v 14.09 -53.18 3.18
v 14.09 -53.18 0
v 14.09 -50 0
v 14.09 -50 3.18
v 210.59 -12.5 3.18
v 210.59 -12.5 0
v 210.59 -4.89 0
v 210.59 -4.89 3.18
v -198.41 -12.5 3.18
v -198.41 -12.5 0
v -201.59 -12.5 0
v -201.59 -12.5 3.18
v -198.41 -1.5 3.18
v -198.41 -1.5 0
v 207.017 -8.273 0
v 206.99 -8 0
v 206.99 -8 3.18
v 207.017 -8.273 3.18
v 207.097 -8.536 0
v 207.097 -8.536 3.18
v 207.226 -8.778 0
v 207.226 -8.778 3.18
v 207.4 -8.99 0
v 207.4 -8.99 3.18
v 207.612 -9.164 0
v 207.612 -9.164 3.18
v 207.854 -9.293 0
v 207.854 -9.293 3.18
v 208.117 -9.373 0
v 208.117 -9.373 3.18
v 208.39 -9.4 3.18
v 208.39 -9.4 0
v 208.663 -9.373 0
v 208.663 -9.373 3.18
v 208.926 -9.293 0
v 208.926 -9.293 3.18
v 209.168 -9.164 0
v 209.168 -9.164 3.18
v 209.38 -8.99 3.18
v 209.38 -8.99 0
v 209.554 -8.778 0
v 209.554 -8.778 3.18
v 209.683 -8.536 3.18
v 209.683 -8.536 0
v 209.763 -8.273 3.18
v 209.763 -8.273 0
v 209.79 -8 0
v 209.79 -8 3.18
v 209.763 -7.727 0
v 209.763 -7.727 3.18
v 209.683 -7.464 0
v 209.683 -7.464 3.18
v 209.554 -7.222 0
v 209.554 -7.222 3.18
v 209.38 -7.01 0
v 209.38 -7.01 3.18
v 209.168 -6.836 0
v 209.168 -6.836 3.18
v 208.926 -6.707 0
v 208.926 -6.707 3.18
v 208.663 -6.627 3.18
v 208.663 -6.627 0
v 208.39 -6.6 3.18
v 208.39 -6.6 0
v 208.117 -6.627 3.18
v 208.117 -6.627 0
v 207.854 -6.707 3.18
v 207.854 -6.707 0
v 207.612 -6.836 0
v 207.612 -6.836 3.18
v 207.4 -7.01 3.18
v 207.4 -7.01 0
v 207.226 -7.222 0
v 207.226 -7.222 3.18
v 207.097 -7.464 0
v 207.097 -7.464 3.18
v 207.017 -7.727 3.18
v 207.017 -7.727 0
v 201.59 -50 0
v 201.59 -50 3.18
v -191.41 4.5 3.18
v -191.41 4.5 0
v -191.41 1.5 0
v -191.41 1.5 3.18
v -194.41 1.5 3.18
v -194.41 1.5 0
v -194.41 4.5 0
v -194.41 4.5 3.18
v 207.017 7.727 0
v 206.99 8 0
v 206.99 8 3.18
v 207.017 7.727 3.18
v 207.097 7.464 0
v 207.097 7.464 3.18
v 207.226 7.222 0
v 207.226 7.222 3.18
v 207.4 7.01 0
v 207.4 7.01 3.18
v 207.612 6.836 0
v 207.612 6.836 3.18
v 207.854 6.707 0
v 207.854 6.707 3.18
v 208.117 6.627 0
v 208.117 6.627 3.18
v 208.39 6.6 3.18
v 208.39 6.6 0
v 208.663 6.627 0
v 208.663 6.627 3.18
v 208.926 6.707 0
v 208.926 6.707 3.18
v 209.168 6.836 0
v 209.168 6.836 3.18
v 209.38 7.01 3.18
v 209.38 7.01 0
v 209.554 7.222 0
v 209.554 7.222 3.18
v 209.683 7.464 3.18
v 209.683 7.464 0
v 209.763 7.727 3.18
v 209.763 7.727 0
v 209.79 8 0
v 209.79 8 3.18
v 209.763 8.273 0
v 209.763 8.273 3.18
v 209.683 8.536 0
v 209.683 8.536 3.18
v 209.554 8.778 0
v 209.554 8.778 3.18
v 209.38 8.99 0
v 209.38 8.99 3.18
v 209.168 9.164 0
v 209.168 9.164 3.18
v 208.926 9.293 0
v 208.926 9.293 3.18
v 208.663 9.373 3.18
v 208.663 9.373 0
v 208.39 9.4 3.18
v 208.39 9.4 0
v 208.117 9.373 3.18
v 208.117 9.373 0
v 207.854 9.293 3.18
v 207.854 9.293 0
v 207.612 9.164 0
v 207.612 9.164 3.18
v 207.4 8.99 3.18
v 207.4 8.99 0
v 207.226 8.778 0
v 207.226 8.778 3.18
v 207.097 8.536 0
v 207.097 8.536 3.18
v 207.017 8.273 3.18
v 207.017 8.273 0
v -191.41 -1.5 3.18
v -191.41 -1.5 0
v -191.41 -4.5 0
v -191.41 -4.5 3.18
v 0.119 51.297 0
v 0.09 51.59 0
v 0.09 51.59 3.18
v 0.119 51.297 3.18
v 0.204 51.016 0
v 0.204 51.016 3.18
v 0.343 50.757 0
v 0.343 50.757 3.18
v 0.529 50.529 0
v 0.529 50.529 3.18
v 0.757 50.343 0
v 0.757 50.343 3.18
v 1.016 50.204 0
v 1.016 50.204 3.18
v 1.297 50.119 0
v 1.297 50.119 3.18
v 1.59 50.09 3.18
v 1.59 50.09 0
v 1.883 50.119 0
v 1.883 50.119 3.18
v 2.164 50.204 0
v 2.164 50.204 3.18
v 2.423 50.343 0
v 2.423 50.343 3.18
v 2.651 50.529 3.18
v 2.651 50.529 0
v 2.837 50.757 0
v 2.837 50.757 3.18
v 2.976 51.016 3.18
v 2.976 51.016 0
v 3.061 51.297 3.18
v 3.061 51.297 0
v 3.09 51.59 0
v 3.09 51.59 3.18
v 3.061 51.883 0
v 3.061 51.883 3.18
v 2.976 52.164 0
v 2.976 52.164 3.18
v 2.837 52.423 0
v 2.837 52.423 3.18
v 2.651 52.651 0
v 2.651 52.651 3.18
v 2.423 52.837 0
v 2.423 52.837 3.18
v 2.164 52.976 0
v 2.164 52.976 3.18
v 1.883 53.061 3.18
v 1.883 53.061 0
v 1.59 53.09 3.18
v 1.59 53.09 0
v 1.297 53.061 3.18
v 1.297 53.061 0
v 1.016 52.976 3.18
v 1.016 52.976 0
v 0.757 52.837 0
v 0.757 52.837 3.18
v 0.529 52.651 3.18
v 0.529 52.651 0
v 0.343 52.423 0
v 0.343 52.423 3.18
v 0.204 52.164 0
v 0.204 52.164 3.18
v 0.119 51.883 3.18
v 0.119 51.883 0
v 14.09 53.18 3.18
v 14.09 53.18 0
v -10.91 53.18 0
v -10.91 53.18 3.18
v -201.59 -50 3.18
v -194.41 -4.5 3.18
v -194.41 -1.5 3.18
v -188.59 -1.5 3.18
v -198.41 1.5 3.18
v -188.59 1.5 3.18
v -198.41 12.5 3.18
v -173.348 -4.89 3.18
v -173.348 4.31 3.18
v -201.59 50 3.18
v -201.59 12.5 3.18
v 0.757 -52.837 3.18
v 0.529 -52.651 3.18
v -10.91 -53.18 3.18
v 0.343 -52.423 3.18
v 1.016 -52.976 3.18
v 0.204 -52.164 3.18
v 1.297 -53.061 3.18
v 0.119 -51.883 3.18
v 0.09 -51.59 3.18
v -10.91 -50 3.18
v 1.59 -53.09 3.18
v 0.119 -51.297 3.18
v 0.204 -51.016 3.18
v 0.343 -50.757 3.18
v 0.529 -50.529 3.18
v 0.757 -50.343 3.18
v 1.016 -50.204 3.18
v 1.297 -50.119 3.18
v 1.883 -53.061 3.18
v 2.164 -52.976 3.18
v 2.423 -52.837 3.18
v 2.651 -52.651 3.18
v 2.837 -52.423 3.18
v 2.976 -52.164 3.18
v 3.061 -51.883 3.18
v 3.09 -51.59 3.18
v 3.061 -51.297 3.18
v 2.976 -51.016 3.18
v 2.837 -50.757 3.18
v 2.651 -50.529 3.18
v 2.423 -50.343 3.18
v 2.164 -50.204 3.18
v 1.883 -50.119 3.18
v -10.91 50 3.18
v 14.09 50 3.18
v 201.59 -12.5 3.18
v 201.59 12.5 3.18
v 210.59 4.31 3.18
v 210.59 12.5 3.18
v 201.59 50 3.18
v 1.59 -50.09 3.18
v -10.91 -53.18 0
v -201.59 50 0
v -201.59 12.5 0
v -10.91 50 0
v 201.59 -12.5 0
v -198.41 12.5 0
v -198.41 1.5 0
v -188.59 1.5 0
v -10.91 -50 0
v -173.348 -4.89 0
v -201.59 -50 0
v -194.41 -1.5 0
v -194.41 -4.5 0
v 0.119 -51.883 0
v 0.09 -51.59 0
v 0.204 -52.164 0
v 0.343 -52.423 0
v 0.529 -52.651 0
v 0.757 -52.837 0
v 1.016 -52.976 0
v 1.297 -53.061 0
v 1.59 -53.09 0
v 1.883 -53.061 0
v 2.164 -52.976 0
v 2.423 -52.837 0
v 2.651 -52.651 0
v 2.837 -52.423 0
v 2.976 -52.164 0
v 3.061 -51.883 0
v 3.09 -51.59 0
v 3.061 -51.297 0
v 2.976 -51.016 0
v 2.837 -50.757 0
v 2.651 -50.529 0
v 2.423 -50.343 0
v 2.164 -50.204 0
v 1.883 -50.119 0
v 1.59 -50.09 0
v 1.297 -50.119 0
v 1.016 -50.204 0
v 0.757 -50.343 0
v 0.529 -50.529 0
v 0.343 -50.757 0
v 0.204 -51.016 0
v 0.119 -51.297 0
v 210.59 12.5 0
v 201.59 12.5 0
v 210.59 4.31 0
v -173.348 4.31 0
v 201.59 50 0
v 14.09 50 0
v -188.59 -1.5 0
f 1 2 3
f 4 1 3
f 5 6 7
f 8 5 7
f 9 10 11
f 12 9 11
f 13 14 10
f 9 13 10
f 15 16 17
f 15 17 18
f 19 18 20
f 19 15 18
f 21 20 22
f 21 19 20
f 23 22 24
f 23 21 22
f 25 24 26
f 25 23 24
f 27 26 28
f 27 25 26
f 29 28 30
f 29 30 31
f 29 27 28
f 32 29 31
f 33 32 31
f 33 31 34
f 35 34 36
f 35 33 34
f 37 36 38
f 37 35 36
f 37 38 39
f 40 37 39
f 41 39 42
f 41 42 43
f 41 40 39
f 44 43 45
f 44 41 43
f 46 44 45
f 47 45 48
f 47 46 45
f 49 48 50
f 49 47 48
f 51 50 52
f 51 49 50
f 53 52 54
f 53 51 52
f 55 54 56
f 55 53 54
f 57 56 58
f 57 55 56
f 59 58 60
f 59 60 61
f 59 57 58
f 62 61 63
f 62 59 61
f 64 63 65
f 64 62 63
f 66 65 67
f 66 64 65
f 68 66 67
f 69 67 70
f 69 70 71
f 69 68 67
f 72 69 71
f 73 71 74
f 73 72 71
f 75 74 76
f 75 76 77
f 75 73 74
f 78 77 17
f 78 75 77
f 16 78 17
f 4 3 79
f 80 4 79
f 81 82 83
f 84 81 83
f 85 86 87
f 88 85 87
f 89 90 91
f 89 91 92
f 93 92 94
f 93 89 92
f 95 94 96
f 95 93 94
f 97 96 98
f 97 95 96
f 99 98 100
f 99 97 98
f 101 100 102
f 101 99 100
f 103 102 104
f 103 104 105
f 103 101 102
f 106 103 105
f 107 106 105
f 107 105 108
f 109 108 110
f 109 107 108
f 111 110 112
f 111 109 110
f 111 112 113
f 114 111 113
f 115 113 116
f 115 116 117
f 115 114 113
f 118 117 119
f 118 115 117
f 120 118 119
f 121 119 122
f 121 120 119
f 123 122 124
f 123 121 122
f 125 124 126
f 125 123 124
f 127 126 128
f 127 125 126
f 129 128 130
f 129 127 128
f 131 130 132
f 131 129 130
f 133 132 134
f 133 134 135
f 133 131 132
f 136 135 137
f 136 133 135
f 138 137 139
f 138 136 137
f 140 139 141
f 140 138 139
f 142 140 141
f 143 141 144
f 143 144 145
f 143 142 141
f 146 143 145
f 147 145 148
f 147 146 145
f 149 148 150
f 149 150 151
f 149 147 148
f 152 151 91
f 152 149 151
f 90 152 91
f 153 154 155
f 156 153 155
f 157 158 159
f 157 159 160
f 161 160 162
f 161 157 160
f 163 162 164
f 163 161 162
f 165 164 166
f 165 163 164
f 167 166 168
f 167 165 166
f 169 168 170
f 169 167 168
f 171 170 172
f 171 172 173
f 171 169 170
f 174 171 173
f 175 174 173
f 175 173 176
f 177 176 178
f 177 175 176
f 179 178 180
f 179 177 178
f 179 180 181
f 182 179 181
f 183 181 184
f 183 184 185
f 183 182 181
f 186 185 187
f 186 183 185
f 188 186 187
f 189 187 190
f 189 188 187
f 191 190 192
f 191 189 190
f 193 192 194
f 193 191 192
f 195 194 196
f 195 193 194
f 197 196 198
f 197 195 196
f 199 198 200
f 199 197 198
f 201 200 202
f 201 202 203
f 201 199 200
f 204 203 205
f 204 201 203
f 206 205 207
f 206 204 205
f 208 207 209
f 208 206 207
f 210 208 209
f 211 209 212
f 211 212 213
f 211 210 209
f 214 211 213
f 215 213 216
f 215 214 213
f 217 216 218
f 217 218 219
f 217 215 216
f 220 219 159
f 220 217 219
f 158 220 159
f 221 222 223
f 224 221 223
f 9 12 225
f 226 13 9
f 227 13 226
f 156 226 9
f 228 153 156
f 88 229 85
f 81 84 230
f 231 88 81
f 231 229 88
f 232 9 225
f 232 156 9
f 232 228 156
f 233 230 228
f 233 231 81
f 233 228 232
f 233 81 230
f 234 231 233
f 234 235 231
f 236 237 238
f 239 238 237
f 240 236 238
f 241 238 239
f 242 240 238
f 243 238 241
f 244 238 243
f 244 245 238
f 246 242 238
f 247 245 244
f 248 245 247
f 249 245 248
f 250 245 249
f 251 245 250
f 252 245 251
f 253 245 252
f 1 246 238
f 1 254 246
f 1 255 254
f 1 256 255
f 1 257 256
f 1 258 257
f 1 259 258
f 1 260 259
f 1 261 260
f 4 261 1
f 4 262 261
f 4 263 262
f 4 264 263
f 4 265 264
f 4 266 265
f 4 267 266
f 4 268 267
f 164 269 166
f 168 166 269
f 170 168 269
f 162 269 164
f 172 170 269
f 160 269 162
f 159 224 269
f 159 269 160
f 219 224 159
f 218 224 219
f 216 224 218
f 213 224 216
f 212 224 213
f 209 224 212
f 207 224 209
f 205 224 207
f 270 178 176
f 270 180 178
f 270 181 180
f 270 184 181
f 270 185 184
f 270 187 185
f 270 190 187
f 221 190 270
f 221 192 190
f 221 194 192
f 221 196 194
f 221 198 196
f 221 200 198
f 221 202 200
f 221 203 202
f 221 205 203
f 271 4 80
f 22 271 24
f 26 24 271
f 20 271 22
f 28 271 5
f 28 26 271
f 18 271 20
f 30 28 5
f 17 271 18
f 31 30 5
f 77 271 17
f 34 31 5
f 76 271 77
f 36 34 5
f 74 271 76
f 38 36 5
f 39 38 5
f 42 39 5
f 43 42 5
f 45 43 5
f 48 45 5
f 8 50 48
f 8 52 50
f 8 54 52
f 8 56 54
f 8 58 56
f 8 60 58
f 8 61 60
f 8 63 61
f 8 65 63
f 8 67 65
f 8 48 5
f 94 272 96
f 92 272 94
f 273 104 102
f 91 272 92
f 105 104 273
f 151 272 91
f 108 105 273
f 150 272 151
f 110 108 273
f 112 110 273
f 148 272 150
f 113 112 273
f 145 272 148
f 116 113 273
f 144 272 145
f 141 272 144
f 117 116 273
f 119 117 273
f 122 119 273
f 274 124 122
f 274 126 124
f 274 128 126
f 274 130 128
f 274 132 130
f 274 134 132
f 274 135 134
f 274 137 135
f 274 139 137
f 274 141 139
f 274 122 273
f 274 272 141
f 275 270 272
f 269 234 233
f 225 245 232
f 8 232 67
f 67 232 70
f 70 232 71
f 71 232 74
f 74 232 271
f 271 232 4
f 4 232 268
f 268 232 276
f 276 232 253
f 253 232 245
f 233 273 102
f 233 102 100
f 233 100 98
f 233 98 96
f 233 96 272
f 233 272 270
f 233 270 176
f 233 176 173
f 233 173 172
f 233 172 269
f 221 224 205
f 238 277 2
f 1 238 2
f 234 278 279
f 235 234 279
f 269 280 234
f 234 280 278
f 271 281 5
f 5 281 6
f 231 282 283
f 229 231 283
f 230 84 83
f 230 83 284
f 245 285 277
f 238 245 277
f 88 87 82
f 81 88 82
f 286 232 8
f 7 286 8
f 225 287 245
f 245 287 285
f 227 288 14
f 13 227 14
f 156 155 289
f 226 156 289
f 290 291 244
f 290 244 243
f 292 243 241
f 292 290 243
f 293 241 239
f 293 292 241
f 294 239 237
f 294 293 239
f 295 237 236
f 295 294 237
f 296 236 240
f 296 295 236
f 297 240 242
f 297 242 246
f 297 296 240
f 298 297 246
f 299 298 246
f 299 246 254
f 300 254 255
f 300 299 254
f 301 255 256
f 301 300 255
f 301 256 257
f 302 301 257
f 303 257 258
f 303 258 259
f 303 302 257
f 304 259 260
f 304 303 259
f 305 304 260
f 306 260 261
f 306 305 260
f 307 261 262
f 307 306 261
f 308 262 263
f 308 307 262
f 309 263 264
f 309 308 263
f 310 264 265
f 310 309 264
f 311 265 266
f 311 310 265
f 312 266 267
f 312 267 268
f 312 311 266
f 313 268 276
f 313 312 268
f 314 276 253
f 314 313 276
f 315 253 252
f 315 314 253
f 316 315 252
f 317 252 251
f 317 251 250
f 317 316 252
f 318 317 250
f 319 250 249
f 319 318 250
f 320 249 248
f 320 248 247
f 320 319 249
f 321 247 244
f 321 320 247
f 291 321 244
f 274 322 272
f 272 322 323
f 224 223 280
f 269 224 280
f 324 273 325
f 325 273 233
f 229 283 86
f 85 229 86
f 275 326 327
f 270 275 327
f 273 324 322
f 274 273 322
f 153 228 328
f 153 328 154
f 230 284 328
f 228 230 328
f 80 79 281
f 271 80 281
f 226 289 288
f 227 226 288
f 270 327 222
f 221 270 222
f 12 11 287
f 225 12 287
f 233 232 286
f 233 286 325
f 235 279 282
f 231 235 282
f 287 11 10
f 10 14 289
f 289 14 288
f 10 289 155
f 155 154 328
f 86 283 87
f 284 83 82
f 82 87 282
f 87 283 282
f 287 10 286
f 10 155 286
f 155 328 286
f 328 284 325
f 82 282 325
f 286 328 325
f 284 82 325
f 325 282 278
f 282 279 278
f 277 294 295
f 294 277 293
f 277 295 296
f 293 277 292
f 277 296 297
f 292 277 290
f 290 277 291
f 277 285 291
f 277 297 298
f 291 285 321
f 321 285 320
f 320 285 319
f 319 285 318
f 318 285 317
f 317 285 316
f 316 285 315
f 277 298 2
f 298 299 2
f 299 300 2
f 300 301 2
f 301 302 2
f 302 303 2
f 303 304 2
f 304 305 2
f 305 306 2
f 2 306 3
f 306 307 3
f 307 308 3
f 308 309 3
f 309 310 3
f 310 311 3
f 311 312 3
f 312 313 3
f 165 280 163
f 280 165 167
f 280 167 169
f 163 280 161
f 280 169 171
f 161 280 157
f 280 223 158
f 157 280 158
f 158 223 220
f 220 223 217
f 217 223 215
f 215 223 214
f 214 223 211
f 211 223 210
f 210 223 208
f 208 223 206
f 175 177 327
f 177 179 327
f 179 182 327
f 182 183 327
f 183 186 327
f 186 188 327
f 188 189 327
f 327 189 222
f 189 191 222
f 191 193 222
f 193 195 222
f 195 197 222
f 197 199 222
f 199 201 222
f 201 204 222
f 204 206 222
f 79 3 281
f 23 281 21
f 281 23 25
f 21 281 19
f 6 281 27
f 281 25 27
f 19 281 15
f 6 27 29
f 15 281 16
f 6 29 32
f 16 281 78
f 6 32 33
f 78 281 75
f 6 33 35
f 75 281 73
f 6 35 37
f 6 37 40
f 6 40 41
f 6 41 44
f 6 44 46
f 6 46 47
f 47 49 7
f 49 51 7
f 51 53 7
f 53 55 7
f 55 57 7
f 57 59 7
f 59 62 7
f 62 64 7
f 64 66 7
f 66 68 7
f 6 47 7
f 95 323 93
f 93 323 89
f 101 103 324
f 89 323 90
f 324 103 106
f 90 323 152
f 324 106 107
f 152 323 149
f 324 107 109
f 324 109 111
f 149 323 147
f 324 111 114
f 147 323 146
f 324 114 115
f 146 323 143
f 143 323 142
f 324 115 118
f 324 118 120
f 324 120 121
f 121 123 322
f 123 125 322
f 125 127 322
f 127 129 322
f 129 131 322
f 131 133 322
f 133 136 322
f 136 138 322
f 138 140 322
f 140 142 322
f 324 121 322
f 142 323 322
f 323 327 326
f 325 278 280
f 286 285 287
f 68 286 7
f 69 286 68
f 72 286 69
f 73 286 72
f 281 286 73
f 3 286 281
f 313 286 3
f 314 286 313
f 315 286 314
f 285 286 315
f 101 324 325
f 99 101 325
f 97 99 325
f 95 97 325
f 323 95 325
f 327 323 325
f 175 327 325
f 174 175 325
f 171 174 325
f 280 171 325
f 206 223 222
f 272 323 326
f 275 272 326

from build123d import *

# Parameters (mm, degrees)
SKETCH1_R           = 1.5
SKETCH1_R_2         = 1.4
BOSS_EXTRUDE1_DEPTH = 3.18
CUT_EXTRUDE1_DEPTH  = 10


with BuildPart() as part:
    # Sketch1 → Boss-Extrude1 (new body)
    with BuildSketch(Plane.XY):
        Polygon((-201.59, 50), (-201.59, 12.5), (-198.41, 12.5), (-198.41, 1.5), (-194.41, 1.5), (-194.41, 4.5), (-191.41, 4.5), (-191.41, 1.5), (-188.59, 1.5), (-188.59, -1.5), (-191.41, -1.5), (-191.41, -4.5), (-194.41, -4.5), (-194.41, -1.5), (-198.41, -1.5), (-198.41, -12.5), (-201.59, -12.5), (-201.59, -50), (-10.91, -50), (-10.91, -53.18), (14.09, -53.18), (14.09, -50), (201.59, -50), (201.59, -12.5), (210.59, -12.5), (210.59, 12.5), (201.59, 12.5), (201.59, 50), (14.09, 50), (14.09, 53.18), (-10.91, 53.18), (-10.91, 50), align=None)
        with Locations(Location((1.59, 51.59, 0), (0, 0, 180))):
            Circle(SKETCH1_R, mode=Mode.SUBTRACT)
        with Locations(Location((1.59, -51.59, 0), (0, 0, 180))):
            Circle(SKETCH1_R, mode=Mode.SUBTRACT)
        with Locations(Location((208.39, 8, 0), (0, 0, 180))):
            Circle(SKETCH1_R_2, mode=Mode.SUBTRACT)
        with Locations(Location((208.39, -8, 0), (0, 0, 180))):
            Circle(SKETCH1_R_2, mode=Mode.SUBTRACT)
    extrude(amount=BOSS_EXTRUDE1_DEPTH)

    # Sketch2 → Cut-Extrude1 (cut)
    with BuildSketch(Plane.XY.offset(3.18)):
        Polygon((-173.347543098, 4.310263234), (152.804450916, 4.310263234), (201.59, 4.310263234), (212.087554944, 4.310263234), (212.087554944, -4.889736766), (201.37, -4.889736766), (196.652456902, -4.889736766), (-173.347543098, -4.889736766), align=None)
    extrude(amount=-CUT_EXTRUDE1_DEPTH, mode=Mode.SUBTRACT)


solid = part.part
